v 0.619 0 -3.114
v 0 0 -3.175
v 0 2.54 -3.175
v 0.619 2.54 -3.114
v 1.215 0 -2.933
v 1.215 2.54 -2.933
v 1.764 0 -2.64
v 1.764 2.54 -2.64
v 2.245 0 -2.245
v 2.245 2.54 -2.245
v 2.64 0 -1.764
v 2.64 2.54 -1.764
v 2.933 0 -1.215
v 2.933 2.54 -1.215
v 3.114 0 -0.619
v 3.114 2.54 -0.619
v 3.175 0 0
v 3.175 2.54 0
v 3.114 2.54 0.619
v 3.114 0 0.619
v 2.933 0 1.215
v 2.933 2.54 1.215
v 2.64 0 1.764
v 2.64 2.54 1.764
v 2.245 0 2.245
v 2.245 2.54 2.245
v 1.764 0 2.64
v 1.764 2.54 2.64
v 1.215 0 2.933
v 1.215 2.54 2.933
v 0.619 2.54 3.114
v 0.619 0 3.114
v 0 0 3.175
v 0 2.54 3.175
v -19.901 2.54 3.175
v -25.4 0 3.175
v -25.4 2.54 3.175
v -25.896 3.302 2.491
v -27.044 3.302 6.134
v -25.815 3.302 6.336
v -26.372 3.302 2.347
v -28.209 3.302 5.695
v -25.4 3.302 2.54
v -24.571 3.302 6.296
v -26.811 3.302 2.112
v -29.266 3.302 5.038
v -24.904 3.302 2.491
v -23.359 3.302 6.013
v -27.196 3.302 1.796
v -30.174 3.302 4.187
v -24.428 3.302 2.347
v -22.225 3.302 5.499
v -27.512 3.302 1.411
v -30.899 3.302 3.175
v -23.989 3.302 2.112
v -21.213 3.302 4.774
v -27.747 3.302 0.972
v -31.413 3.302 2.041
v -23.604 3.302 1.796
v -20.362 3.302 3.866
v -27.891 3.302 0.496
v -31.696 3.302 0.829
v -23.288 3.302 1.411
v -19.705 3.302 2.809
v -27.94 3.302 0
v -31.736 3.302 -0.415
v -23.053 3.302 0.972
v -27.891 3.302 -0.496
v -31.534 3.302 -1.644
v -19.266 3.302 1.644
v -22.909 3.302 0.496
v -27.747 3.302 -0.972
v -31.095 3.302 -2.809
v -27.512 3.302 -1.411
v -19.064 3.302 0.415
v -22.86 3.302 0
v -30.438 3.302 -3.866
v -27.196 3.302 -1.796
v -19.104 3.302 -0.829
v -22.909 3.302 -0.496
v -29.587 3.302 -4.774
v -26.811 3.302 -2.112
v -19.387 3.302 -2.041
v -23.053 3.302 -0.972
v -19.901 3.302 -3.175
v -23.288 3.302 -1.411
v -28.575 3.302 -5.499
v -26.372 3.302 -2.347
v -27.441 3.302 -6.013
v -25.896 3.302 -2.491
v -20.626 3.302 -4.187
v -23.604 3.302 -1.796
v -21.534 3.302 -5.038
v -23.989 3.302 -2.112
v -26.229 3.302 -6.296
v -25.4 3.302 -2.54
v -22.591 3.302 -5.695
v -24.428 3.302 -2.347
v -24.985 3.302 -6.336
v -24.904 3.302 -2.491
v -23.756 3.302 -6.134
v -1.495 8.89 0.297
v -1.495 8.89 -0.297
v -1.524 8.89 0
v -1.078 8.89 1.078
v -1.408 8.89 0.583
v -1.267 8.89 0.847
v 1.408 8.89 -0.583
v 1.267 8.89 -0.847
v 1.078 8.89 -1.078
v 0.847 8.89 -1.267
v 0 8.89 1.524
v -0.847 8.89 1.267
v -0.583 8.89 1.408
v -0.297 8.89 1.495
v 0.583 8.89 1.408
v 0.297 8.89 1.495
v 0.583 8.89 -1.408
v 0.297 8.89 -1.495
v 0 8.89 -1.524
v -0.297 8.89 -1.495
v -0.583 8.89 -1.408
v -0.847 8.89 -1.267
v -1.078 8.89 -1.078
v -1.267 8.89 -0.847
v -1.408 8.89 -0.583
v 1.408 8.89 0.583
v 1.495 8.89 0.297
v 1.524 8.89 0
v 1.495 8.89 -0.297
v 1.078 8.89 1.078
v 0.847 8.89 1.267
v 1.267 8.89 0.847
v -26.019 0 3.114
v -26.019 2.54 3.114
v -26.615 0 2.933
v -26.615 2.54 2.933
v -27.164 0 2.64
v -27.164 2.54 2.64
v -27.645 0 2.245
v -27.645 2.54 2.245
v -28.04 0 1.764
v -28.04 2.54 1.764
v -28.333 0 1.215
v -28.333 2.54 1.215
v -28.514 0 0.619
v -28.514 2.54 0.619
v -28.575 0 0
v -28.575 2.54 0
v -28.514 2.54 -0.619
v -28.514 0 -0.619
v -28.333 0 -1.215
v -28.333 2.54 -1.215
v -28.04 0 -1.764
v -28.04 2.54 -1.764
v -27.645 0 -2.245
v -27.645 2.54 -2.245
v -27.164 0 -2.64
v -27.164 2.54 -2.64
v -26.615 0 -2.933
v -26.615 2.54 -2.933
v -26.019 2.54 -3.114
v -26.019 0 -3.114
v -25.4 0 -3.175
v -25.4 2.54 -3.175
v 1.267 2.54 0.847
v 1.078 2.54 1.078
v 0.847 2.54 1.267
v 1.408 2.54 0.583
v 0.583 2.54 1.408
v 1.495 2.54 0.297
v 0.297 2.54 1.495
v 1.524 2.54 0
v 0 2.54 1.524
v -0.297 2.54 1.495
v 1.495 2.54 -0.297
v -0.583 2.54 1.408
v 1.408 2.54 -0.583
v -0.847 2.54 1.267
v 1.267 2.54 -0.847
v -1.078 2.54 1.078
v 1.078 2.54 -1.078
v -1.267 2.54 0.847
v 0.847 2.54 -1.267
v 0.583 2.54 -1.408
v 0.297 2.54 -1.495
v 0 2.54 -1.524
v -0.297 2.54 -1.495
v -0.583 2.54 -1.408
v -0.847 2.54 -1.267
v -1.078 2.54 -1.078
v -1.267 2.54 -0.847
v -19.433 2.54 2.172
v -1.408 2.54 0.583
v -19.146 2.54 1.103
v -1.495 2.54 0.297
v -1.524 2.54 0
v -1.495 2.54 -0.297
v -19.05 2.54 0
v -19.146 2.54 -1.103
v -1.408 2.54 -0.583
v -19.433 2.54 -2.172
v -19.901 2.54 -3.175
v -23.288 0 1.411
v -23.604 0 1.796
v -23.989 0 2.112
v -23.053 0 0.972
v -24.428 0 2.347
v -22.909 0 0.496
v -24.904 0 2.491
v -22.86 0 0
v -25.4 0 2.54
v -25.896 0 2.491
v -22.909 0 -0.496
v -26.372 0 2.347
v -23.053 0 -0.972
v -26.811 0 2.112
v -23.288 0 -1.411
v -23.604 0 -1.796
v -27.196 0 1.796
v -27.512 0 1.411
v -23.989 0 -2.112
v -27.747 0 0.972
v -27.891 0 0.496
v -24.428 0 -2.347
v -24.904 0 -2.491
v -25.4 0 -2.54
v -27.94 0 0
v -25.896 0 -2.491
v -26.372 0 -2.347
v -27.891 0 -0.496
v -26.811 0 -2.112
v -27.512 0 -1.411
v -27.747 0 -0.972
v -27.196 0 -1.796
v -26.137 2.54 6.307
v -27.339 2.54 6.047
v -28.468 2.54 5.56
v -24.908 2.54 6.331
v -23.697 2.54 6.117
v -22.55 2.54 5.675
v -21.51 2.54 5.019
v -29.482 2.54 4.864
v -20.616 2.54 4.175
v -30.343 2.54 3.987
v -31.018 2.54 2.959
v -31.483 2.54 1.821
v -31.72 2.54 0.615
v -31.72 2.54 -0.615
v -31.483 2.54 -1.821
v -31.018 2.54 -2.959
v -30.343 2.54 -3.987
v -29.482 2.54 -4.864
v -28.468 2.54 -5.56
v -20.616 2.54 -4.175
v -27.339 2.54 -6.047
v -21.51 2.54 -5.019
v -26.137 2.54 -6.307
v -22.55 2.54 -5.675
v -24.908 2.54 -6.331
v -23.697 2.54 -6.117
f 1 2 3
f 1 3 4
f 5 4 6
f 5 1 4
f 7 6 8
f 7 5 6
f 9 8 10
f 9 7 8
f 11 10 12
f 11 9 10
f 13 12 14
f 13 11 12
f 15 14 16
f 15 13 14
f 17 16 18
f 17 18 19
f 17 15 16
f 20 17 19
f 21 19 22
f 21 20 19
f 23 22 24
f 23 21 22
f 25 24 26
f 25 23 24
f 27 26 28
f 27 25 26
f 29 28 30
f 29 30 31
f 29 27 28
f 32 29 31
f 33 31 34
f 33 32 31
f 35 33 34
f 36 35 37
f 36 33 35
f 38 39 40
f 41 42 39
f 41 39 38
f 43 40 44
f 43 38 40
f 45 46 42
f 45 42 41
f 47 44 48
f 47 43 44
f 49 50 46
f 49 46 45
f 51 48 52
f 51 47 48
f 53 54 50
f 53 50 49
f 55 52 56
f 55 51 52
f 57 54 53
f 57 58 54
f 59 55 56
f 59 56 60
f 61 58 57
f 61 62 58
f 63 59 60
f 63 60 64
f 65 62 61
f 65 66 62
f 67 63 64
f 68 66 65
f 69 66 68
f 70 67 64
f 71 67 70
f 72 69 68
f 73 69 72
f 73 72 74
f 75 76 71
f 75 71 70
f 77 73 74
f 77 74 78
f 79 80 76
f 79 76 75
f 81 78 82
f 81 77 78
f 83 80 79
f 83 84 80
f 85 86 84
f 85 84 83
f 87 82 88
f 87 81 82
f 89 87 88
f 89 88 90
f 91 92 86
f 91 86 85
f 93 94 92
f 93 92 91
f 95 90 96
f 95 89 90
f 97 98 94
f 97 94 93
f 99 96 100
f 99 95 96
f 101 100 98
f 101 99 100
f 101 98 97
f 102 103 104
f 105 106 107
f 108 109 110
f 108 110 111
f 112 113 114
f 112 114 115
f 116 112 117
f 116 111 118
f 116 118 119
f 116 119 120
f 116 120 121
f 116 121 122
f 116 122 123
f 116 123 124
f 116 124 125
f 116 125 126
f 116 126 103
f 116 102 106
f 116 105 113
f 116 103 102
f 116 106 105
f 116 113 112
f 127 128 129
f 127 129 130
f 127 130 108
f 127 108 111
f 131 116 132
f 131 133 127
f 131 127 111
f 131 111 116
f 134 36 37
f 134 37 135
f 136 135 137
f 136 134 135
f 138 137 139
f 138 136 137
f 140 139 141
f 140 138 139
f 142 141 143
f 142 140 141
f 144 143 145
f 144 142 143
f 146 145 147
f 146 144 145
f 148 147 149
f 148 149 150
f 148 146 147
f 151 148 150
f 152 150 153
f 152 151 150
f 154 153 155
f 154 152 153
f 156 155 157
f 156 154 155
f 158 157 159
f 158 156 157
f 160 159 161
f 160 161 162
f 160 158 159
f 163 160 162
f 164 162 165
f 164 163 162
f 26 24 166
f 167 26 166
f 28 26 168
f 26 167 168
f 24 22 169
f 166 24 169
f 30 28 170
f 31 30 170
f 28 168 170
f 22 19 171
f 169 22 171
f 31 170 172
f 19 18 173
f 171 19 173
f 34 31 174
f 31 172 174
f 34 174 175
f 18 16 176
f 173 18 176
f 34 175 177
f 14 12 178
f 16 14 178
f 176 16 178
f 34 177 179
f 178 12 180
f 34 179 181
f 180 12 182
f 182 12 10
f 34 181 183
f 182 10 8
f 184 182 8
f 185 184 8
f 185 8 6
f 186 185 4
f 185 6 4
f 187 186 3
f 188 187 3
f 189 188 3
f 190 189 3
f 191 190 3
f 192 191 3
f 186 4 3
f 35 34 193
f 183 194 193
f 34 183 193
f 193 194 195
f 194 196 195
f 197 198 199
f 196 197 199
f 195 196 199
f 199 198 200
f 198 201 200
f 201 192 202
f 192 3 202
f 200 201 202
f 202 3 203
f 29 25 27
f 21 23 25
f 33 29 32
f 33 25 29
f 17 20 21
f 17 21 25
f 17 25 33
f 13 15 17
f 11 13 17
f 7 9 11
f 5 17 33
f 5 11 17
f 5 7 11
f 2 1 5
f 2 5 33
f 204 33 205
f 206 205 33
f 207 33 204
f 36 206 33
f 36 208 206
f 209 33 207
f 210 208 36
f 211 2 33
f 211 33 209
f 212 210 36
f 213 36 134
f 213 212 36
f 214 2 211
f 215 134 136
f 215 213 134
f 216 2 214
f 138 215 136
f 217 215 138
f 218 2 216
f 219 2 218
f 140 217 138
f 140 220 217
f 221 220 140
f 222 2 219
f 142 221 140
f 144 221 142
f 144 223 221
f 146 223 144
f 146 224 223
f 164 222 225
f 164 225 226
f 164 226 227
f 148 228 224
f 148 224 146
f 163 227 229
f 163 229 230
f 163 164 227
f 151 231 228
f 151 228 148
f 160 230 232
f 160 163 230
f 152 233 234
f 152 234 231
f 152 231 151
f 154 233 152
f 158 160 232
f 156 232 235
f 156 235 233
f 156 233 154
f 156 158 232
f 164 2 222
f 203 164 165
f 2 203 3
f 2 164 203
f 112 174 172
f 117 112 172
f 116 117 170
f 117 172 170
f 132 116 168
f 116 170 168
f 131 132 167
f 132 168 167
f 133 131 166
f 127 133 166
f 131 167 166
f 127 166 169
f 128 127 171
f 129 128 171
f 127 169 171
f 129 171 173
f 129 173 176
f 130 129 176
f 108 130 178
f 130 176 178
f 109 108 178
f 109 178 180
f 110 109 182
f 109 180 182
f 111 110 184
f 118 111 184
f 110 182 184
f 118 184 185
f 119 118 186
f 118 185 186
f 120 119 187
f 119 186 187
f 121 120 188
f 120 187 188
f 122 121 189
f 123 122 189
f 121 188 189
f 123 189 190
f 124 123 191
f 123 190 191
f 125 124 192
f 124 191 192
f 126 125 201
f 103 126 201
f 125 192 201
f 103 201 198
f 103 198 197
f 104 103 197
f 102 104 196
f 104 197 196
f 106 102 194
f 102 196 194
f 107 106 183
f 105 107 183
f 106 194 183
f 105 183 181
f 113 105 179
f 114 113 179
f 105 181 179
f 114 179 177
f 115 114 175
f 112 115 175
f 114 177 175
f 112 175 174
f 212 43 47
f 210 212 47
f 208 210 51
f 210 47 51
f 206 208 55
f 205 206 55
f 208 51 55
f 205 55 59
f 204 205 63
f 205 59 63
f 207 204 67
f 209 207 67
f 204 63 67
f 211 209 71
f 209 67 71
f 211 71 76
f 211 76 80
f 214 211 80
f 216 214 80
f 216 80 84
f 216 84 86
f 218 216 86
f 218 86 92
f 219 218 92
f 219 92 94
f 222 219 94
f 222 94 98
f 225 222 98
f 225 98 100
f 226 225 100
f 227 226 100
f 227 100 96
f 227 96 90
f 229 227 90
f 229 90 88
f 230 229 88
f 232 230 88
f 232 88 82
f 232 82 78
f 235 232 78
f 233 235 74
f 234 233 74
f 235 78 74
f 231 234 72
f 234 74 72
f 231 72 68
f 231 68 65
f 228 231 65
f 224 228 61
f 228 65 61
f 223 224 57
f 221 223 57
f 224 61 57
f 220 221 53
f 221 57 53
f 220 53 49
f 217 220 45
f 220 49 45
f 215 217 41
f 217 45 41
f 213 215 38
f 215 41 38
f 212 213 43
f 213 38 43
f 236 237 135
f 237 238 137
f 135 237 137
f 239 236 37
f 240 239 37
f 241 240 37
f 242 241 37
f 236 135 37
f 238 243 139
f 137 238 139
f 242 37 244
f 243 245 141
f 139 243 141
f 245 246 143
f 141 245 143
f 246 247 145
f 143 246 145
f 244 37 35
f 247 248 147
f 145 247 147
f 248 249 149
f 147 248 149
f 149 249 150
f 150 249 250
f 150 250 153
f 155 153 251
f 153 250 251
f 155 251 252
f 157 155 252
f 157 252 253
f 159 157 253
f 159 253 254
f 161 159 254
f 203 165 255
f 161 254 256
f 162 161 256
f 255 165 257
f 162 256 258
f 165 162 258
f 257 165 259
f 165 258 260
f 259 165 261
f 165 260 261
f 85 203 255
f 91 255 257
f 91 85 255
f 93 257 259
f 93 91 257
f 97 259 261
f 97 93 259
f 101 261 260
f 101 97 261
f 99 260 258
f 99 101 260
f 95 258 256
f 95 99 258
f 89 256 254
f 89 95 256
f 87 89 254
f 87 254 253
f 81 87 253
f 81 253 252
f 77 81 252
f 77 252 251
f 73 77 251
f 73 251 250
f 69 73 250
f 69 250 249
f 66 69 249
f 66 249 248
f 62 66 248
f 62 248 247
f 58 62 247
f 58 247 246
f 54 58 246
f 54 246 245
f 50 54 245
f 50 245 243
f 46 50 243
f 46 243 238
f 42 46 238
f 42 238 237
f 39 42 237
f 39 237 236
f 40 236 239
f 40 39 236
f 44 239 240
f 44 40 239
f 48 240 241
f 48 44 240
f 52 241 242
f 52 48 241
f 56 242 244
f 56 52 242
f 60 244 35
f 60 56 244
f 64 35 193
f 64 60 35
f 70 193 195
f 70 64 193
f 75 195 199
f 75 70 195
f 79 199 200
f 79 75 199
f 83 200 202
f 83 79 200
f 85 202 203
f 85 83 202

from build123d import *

# Parameters (mm, degrees)
BOSS_EXTRUDE1_DEPTH = 2.54
SKETCH2_R           = 1.524
BOSS_EXTRUDE2_DEPTH = 6.35
SKETCH3_R           = 2.54
CUT_EXTRUDE1_DEPTH  = 30.443738723
BOSS_EXTRUDE3_START = 0.762
SKETCH4_R           = 6.35
SKETCH4_R_2         = 2.54
BOSS_EXTRUDE3_DEPTH = 0.762


with BuildPart() as part:
    # Sketch1 → Boss-Extrude1 (new body)
    with BuildSketch(Plane(origin=(0, 0, 0), x_dir=(1, 0, 0), z_dir=(0, 1, 0))):
        with BuildLine():
            Line((0, -3.175), (-25.4, -3.175))
            ThreePointArc((-25.4, -3.175), (-28.575, 0), (-25.4, 3.175))
            Line((-25.4, 3.175), (0, 3.175))
            ThreePointArc((0, 3.175), (3.175, 0), (0, -3.175))
        make_face()
    extrude(amount=BOSS_EXTRUDE1_DEPTH)

    # Sketch2 → Boss-Extrude2 (add)
    with BuildSketch(Plane(origin=(0, 2.54, 0), x_dir=(1, 0, 0), z_dir=(0, 1, 0))):
        with Locations(Location((0, 0, 0), (0, 0, 270))):
            Circle(SKETCH2_R)
    extrude(amount=BOSS_EXTRUDE2_DEPTH)

    # Sketch3 → Cut-Extrude1 (cut, through all)
    with BuildSketch(Plane(origin=(0, 2.54, 0), x_dir=(1, 0, 0), z_dir=(0, 1, 0))):
        with Locations(Location((-25.4, 0, 0), (0, 0, 270))):
            Circle(SKETCH3_R)
    extrude(amount=-CUT_EXTRUDE1_DEPTH, mode=Mode.SUBTRACT)

    # Sketch4 → Boss-Extrude3 (add)
    with BuildSketch(Plane(origin=(0, 2.54, 0), x_dir=(1, 0, 0), z_dir=(0, 1, 0)).offset(BOSS_EXTRUDE3_START)):
        with Locations(Location((-25.4, 0, 0), (0, 0, 30))):
            Circle(SKETCH4_R)
        with Locations(Location((-25.4, 0, 0), (0, 0, 270))):
            Circle(SKETCH4_R_2, mode=Mode.SUBTRACT)
    extrude(amount=-BOSS_EXTRUDE3_DEPTH)


solid = part.part
